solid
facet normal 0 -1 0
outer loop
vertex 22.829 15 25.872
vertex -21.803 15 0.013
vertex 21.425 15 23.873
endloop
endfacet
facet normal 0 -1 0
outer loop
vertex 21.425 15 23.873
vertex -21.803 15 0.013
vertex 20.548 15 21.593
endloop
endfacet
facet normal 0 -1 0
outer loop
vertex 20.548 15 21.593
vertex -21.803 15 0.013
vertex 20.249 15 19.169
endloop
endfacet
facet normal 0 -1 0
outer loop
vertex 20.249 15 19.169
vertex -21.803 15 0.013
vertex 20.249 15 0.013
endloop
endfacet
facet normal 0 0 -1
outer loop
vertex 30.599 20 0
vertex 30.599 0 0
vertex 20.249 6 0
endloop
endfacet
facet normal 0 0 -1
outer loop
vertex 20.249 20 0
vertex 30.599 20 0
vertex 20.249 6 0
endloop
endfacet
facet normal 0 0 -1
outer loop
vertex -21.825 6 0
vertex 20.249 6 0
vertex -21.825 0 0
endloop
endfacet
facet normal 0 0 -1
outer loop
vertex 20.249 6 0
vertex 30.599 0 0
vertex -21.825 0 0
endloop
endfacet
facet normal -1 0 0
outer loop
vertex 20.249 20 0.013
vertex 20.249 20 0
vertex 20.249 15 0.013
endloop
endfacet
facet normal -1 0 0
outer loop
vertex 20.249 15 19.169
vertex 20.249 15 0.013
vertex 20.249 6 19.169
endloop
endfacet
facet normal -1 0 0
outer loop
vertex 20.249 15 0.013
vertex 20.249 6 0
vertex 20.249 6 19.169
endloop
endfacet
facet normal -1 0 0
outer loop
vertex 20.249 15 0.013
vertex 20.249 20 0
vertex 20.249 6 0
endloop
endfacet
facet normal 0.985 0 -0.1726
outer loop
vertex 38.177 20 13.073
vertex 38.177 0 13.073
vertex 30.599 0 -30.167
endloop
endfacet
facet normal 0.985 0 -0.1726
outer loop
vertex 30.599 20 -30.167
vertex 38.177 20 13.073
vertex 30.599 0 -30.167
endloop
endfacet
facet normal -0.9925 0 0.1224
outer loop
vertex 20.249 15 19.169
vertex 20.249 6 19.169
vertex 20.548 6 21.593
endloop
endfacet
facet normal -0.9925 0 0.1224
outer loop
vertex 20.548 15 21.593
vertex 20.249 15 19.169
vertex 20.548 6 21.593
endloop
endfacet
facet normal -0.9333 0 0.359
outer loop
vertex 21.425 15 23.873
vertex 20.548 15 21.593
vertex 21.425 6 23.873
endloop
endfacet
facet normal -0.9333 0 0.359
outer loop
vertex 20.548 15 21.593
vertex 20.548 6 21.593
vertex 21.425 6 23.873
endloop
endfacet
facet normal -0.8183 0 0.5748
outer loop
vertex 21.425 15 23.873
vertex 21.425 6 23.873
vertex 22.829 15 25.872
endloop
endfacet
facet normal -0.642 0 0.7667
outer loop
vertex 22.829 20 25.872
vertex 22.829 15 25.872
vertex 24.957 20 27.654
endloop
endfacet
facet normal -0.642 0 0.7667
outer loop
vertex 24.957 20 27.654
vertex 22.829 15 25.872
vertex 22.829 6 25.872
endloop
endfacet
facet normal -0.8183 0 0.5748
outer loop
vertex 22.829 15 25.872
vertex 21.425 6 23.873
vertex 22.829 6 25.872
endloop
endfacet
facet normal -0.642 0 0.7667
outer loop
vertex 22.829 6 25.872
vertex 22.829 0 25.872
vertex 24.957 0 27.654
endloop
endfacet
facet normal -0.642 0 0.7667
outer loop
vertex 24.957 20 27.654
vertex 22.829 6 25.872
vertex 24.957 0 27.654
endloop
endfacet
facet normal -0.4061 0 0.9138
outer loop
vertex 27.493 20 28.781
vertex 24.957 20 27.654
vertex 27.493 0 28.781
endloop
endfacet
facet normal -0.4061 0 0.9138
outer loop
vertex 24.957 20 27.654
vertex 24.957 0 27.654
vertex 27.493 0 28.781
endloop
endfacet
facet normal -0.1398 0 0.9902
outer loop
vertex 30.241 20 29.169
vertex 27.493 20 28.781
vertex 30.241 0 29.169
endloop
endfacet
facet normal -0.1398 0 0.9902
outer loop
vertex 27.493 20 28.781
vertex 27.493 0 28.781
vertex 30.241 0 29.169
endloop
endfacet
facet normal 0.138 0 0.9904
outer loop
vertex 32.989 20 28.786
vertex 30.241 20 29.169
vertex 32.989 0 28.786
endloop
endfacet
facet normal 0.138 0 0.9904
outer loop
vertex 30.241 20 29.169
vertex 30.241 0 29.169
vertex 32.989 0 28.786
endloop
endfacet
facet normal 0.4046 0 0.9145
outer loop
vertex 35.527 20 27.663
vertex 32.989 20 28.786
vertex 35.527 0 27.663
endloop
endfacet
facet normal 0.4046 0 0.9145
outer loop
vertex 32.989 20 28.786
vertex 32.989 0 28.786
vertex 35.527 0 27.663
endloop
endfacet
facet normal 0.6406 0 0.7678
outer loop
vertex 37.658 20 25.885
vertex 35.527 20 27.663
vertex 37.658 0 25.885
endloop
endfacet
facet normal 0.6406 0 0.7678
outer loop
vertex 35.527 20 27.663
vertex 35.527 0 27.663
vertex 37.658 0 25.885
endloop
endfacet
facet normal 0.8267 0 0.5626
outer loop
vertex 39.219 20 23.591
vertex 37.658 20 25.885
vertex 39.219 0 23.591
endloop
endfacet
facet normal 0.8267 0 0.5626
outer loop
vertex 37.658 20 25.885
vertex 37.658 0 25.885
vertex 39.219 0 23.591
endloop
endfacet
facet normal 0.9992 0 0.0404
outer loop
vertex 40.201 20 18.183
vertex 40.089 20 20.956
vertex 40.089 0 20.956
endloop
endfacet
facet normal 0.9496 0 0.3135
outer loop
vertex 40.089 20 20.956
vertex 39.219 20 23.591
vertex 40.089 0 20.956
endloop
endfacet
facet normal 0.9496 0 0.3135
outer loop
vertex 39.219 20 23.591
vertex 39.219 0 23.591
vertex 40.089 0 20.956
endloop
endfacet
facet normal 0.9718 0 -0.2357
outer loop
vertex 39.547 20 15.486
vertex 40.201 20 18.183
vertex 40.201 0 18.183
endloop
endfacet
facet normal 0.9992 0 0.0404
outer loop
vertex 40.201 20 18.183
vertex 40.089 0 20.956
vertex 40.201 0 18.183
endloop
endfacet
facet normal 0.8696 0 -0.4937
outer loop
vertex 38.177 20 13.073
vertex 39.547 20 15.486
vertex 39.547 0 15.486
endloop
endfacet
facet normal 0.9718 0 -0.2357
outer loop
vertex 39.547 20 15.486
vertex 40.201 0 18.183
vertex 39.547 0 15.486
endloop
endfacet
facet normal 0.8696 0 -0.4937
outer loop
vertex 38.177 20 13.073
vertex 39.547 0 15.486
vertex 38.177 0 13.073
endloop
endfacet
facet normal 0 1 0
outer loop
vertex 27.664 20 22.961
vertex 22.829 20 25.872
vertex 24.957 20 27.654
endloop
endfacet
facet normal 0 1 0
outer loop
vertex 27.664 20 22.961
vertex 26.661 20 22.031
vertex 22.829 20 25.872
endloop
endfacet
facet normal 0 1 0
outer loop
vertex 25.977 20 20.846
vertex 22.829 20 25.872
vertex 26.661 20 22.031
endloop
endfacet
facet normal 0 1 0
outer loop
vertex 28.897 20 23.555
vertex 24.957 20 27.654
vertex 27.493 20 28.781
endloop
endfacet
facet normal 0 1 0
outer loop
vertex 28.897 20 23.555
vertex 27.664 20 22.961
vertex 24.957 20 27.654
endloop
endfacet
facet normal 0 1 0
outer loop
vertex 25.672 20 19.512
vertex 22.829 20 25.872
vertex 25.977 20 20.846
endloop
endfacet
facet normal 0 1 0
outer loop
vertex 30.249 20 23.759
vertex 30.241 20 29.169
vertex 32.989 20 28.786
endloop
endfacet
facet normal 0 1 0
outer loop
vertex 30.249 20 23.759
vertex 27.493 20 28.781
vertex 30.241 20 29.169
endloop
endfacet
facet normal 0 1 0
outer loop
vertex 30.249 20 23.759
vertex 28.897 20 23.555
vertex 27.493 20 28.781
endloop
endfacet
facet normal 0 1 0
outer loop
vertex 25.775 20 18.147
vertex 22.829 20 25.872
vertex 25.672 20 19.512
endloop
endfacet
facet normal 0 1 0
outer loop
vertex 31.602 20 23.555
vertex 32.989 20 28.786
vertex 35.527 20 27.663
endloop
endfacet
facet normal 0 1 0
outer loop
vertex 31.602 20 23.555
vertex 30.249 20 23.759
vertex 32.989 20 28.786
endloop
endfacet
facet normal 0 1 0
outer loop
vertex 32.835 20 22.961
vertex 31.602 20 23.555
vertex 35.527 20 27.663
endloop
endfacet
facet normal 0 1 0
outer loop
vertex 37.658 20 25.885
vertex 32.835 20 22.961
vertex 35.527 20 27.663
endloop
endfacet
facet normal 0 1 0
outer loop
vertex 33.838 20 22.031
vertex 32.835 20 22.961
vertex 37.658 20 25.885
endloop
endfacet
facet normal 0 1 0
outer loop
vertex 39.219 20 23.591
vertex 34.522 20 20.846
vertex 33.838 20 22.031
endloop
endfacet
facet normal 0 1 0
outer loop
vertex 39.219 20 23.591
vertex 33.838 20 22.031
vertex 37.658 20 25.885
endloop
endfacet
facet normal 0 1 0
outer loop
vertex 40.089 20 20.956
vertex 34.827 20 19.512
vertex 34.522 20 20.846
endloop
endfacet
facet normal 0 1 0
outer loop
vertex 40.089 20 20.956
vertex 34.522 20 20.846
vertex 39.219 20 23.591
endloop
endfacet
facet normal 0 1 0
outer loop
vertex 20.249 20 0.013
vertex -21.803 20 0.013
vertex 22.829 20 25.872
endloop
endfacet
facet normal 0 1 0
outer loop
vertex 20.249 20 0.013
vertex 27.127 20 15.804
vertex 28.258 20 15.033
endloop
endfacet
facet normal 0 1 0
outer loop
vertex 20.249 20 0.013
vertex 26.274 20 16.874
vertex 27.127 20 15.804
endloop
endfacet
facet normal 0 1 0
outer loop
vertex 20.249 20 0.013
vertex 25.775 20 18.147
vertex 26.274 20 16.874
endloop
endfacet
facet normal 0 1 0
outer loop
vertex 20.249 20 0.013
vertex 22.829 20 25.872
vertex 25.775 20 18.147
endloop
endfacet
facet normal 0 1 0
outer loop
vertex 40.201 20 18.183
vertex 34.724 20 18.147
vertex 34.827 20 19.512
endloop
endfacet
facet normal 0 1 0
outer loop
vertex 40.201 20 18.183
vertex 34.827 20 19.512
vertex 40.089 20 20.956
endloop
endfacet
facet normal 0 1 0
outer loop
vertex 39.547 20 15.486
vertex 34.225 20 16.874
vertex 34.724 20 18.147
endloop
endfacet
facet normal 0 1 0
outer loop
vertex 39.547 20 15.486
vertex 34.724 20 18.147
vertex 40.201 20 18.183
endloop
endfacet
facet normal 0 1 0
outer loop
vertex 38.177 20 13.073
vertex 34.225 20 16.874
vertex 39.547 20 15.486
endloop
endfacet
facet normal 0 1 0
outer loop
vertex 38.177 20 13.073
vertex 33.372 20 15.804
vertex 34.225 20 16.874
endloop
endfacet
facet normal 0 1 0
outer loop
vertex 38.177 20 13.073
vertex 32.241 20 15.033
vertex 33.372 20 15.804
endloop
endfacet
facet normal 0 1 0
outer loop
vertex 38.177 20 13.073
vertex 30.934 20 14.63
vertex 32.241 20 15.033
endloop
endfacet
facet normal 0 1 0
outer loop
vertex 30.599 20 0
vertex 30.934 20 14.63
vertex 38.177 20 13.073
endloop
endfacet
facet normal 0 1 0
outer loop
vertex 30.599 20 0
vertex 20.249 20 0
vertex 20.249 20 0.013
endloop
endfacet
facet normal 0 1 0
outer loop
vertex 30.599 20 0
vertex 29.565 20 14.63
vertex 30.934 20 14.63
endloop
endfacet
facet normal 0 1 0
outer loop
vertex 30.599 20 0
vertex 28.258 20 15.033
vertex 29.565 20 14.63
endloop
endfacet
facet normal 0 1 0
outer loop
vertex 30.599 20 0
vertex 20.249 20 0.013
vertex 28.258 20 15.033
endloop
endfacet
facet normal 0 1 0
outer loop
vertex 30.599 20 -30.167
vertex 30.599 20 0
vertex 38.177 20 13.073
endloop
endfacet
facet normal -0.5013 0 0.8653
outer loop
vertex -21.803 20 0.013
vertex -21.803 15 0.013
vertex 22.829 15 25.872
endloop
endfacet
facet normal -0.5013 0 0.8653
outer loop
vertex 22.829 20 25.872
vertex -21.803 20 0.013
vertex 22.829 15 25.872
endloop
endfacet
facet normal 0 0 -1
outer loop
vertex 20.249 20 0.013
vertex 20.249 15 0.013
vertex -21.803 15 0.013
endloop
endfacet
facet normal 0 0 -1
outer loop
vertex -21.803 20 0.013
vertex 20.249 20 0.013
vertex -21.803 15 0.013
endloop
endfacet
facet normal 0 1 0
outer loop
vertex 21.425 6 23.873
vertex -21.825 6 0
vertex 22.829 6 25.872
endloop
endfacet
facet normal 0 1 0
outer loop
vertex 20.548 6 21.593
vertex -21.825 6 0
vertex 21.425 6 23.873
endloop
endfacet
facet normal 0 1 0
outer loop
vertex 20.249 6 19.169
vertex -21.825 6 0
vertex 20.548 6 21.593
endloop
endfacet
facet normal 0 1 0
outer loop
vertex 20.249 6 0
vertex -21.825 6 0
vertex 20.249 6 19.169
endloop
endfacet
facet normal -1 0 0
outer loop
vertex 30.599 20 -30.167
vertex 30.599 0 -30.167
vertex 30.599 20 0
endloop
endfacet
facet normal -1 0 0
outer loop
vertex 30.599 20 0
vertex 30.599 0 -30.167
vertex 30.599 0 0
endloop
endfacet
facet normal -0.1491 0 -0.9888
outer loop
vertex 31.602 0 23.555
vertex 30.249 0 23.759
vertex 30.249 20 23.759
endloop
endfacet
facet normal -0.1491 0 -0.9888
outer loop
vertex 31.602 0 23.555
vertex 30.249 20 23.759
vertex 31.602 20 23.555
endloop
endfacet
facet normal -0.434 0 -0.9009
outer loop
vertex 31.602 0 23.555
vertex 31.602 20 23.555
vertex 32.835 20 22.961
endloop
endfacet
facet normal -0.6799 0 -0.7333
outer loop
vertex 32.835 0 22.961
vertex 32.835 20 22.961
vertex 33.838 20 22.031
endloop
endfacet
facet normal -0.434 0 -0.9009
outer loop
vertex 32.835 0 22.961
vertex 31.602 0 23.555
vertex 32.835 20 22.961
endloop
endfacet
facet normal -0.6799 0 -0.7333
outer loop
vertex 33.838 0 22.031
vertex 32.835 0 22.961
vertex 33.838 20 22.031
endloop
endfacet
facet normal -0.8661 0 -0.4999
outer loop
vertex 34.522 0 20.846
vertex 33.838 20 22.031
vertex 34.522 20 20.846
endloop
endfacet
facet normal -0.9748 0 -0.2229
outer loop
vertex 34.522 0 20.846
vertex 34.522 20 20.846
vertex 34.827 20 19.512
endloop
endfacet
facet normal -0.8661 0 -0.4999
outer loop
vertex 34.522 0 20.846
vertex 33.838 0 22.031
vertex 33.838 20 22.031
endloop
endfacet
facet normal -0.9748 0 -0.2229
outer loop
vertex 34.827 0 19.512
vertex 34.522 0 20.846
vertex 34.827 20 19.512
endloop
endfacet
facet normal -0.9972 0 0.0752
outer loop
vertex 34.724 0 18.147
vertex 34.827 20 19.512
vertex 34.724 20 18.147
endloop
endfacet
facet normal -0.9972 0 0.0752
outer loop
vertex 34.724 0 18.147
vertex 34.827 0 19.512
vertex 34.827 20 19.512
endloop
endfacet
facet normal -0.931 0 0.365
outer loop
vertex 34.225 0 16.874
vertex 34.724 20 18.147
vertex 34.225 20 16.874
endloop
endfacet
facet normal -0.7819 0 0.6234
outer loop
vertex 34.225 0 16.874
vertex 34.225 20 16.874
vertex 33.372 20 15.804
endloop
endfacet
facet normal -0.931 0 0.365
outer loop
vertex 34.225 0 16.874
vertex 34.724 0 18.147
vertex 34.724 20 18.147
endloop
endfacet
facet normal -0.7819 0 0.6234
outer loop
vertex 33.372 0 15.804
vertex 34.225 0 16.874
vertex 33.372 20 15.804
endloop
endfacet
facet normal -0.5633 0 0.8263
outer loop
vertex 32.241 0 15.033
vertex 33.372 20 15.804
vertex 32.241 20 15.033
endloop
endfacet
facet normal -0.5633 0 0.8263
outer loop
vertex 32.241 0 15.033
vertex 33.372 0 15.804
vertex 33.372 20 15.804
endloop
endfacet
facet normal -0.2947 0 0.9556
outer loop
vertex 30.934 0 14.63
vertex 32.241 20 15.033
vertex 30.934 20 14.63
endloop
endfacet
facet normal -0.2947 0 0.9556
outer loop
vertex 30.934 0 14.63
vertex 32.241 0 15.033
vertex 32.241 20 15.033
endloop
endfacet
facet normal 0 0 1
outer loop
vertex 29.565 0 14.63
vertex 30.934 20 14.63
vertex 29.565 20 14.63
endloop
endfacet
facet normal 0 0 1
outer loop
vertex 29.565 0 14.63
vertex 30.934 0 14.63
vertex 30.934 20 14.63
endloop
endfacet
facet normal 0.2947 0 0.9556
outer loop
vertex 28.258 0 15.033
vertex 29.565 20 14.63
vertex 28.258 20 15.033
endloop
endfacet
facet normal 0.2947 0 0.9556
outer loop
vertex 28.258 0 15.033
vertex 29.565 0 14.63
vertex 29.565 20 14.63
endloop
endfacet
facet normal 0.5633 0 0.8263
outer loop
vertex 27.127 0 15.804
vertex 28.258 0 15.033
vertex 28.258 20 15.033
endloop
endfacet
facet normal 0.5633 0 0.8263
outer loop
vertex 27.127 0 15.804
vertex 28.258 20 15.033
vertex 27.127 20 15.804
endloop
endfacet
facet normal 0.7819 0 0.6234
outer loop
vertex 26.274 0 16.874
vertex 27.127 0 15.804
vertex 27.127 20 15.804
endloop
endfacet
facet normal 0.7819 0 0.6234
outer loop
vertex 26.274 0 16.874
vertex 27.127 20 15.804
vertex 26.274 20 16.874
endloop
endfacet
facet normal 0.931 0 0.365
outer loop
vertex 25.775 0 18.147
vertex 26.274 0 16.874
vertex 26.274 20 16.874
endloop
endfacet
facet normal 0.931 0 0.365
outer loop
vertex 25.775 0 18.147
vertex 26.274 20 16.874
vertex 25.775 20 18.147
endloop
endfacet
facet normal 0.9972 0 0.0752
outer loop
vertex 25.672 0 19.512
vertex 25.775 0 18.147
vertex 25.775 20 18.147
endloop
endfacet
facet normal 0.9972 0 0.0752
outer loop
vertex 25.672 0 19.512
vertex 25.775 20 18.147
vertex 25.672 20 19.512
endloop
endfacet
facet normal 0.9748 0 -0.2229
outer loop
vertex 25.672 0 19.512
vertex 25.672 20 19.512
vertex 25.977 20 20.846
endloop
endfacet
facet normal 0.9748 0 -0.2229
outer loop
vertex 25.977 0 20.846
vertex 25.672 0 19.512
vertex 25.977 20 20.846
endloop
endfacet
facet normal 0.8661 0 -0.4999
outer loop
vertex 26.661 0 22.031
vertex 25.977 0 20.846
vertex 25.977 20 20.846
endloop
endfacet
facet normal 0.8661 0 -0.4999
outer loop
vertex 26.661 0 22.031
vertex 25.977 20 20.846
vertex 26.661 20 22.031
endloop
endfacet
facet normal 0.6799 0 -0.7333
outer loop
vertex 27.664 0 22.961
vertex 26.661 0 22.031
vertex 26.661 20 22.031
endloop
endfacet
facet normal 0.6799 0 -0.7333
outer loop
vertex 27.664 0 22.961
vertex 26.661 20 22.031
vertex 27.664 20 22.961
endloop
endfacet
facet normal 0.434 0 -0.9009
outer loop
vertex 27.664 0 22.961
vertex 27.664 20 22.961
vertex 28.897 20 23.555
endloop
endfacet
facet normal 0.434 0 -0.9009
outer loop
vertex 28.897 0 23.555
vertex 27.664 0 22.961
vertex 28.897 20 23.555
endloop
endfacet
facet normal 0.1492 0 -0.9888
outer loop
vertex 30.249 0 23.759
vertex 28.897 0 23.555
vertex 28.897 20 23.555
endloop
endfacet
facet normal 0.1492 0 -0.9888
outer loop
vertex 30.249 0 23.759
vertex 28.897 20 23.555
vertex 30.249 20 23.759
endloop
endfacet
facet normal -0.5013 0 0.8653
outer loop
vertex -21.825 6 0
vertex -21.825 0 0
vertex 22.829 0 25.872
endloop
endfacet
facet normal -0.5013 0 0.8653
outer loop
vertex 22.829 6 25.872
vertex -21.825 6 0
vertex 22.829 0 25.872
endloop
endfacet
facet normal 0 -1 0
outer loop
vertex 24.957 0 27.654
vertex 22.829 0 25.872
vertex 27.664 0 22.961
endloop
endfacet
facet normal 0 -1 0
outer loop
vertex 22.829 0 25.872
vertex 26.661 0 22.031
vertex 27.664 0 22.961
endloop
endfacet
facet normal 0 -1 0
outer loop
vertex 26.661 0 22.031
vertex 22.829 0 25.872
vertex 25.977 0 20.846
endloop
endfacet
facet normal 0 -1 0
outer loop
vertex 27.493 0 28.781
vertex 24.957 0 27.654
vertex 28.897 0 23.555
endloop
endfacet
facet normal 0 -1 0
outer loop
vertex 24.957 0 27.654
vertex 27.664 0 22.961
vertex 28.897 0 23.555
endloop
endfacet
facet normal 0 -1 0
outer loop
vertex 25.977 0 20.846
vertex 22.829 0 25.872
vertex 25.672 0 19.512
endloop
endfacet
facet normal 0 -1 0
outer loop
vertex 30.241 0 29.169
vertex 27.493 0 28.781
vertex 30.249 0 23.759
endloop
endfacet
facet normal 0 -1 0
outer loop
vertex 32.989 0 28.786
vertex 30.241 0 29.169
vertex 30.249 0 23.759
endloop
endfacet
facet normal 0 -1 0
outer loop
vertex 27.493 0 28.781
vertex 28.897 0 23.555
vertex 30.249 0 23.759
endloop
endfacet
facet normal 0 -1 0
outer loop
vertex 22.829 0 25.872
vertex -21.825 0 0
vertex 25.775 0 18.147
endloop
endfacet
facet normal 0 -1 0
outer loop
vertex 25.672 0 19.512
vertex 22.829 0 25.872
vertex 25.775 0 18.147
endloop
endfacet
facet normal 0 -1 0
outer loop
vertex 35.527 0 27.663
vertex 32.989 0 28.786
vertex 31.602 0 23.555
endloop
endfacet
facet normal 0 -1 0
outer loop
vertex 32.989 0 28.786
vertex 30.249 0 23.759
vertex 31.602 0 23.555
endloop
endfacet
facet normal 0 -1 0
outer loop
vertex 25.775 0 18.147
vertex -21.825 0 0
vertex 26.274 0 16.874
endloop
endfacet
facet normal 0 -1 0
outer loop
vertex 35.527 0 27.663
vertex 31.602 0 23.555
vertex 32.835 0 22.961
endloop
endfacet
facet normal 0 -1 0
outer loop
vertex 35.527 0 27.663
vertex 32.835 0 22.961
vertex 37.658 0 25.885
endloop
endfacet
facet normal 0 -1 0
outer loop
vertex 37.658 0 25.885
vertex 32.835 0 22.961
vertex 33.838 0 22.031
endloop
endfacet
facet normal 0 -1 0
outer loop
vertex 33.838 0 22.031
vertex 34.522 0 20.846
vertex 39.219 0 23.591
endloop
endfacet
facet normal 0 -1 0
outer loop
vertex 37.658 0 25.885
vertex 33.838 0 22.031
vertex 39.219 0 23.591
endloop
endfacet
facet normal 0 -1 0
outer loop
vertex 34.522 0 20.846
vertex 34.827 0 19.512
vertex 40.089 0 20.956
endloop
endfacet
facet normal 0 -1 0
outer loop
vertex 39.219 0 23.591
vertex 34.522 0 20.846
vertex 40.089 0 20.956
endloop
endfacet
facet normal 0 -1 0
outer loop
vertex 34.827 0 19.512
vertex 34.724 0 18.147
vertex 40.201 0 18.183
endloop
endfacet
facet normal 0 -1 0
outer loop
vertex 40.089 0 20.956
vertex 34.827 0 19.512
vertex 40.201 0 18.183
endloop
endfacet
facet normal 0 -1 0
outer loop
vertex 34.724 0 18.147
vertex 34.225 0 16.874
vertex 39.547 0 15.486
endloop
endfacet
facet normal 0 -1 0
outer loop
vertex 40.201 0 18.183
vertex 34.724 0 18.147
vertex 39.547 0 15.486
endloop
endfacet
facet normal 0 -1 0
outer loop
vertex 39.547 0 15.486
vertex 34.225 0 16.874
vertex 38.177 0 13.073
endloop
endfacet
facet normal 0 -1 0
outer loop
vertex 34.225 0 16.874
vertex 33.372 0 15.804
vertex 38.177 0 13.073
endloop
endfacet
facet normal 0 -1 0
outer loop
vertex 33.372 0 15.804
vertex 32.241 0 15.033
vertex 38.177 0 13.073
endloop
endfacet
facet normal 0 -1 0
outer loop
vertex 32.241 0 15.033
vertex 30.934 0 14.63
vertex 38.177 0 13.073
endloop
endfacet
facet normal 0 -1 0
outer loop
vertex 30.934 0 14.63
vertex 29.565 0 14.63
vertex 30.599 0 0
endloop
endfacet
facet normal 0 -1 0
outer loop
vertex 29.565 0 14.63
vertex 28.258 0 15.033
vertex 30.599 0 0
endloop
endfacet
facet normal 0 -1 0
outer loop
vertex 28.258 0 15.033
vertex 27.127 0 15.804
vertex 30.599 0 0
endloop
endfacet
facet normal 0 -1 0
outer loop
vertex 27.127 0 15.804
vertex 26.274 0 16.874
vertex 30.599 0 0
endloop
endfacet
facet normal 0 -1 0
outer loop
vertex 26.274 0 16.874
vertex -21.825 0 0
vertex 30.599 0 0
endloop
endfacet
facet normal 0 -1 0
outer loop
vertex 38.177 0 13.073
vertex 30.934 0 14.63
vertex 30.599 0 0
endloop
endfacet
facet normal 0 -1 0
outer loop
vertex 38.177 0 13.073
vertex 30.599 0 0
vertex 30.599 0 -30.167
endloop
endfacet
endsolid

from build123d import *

# Parameters (mm, degrees)
SKETCH1_R           = 4.590078396
BOSS_EXTRUDE1_DEPTH = 6
SKETCH1_3_R         = 4.590078396
BOSS_EXTRUDE2_DEPTH = 20
BOSS_EXTRUDE3_START = -5
BOSS_EXTRUDE3_DEPTH = 5


with BuildPart() as part:
    # Sketch1 → Boss-Extrude1 (new body)
    with BuildSketch(Plane(origin=(0, 0, 0), x_dir=(1, 0, 0), z_dir=(0, 1, 0))):
        with BuildLine():
            Line((38.176629583, -13.072793558), (30.598786144, 30.167258341))
            Line((30.598786144, 30.167258341), (30.598786144, 0))
            Line((30.598786144, 0), (-21.824717568, 0))
            Line((-21.824717568, 0), (22.829214597, -25.872426793))
            ThreePointArc((22.829214597, -25.872426793), (36.654329673, -26.84846253), (38.176629583, -13.072793558))
        make_face()
        with Locations((30.24949737, -19.168740974)):
            Circle(SKETCH1_R, mode=Mode.SUBTRACT)
    extrude(amount=BOSS_EXTRUDE1_DEPTH)

    # Sketch1<3> → Boss-Extrude2 (add)
    with BuildSketch(Plane(origin=(0, 0, 0), x_dir=(1, 0, 0), z_dir=(0, 1, 0))):
        with BuildLine():
            Line((38.176629583, -13.072793558), (30.598786144, 30.167258341))
            Line((30.598786144, 30.167258341), (30.598786144, 0))
            Line((30.598786144, 0), (20.24949737, 0))
            Line((20.24949737, 0), (20.24949737, -19.168740974))
            ThreePointArc((20.24949737, -19.168740974), (33.468866709, -28.636352133), (38.176629583, -13.072793558))
        make_face()
        with Locations((30.24949737, -19.168740974)):
            Circle(SKETCH1_3_R, mode=Mode.SUBTRACT)
    extrude(amount=BOSS_EXTRUDE2_DEPTH)

    # Sketch2 → Boss-Extrude3 (add)
    with BuildSketch(Plane(origin=(0, 20, 0), x_dir=(1, 0, 0), z_dir=(0, 1, 0)).offset(BOSS_EXTRUDE3_START)):
        with BuildLine():
            ThreePointArc((22.829214597, -25.872426793), (20.916683547, -22.760201141), (20.24949737, -19.168740974))
            Line((20.24949737, -19.168740974), (20.24949737, -0.012610588))
            Line((20.24949737, -0.012610588), (-21.802952608, -0.012610588))
            Line((-21.802952608, -0.012610588), (22.829214597, -25.872426793))
        make_face()
    extrude(amount=BOSS_EXTRUDE3_DEPTH)


solid = part.part
